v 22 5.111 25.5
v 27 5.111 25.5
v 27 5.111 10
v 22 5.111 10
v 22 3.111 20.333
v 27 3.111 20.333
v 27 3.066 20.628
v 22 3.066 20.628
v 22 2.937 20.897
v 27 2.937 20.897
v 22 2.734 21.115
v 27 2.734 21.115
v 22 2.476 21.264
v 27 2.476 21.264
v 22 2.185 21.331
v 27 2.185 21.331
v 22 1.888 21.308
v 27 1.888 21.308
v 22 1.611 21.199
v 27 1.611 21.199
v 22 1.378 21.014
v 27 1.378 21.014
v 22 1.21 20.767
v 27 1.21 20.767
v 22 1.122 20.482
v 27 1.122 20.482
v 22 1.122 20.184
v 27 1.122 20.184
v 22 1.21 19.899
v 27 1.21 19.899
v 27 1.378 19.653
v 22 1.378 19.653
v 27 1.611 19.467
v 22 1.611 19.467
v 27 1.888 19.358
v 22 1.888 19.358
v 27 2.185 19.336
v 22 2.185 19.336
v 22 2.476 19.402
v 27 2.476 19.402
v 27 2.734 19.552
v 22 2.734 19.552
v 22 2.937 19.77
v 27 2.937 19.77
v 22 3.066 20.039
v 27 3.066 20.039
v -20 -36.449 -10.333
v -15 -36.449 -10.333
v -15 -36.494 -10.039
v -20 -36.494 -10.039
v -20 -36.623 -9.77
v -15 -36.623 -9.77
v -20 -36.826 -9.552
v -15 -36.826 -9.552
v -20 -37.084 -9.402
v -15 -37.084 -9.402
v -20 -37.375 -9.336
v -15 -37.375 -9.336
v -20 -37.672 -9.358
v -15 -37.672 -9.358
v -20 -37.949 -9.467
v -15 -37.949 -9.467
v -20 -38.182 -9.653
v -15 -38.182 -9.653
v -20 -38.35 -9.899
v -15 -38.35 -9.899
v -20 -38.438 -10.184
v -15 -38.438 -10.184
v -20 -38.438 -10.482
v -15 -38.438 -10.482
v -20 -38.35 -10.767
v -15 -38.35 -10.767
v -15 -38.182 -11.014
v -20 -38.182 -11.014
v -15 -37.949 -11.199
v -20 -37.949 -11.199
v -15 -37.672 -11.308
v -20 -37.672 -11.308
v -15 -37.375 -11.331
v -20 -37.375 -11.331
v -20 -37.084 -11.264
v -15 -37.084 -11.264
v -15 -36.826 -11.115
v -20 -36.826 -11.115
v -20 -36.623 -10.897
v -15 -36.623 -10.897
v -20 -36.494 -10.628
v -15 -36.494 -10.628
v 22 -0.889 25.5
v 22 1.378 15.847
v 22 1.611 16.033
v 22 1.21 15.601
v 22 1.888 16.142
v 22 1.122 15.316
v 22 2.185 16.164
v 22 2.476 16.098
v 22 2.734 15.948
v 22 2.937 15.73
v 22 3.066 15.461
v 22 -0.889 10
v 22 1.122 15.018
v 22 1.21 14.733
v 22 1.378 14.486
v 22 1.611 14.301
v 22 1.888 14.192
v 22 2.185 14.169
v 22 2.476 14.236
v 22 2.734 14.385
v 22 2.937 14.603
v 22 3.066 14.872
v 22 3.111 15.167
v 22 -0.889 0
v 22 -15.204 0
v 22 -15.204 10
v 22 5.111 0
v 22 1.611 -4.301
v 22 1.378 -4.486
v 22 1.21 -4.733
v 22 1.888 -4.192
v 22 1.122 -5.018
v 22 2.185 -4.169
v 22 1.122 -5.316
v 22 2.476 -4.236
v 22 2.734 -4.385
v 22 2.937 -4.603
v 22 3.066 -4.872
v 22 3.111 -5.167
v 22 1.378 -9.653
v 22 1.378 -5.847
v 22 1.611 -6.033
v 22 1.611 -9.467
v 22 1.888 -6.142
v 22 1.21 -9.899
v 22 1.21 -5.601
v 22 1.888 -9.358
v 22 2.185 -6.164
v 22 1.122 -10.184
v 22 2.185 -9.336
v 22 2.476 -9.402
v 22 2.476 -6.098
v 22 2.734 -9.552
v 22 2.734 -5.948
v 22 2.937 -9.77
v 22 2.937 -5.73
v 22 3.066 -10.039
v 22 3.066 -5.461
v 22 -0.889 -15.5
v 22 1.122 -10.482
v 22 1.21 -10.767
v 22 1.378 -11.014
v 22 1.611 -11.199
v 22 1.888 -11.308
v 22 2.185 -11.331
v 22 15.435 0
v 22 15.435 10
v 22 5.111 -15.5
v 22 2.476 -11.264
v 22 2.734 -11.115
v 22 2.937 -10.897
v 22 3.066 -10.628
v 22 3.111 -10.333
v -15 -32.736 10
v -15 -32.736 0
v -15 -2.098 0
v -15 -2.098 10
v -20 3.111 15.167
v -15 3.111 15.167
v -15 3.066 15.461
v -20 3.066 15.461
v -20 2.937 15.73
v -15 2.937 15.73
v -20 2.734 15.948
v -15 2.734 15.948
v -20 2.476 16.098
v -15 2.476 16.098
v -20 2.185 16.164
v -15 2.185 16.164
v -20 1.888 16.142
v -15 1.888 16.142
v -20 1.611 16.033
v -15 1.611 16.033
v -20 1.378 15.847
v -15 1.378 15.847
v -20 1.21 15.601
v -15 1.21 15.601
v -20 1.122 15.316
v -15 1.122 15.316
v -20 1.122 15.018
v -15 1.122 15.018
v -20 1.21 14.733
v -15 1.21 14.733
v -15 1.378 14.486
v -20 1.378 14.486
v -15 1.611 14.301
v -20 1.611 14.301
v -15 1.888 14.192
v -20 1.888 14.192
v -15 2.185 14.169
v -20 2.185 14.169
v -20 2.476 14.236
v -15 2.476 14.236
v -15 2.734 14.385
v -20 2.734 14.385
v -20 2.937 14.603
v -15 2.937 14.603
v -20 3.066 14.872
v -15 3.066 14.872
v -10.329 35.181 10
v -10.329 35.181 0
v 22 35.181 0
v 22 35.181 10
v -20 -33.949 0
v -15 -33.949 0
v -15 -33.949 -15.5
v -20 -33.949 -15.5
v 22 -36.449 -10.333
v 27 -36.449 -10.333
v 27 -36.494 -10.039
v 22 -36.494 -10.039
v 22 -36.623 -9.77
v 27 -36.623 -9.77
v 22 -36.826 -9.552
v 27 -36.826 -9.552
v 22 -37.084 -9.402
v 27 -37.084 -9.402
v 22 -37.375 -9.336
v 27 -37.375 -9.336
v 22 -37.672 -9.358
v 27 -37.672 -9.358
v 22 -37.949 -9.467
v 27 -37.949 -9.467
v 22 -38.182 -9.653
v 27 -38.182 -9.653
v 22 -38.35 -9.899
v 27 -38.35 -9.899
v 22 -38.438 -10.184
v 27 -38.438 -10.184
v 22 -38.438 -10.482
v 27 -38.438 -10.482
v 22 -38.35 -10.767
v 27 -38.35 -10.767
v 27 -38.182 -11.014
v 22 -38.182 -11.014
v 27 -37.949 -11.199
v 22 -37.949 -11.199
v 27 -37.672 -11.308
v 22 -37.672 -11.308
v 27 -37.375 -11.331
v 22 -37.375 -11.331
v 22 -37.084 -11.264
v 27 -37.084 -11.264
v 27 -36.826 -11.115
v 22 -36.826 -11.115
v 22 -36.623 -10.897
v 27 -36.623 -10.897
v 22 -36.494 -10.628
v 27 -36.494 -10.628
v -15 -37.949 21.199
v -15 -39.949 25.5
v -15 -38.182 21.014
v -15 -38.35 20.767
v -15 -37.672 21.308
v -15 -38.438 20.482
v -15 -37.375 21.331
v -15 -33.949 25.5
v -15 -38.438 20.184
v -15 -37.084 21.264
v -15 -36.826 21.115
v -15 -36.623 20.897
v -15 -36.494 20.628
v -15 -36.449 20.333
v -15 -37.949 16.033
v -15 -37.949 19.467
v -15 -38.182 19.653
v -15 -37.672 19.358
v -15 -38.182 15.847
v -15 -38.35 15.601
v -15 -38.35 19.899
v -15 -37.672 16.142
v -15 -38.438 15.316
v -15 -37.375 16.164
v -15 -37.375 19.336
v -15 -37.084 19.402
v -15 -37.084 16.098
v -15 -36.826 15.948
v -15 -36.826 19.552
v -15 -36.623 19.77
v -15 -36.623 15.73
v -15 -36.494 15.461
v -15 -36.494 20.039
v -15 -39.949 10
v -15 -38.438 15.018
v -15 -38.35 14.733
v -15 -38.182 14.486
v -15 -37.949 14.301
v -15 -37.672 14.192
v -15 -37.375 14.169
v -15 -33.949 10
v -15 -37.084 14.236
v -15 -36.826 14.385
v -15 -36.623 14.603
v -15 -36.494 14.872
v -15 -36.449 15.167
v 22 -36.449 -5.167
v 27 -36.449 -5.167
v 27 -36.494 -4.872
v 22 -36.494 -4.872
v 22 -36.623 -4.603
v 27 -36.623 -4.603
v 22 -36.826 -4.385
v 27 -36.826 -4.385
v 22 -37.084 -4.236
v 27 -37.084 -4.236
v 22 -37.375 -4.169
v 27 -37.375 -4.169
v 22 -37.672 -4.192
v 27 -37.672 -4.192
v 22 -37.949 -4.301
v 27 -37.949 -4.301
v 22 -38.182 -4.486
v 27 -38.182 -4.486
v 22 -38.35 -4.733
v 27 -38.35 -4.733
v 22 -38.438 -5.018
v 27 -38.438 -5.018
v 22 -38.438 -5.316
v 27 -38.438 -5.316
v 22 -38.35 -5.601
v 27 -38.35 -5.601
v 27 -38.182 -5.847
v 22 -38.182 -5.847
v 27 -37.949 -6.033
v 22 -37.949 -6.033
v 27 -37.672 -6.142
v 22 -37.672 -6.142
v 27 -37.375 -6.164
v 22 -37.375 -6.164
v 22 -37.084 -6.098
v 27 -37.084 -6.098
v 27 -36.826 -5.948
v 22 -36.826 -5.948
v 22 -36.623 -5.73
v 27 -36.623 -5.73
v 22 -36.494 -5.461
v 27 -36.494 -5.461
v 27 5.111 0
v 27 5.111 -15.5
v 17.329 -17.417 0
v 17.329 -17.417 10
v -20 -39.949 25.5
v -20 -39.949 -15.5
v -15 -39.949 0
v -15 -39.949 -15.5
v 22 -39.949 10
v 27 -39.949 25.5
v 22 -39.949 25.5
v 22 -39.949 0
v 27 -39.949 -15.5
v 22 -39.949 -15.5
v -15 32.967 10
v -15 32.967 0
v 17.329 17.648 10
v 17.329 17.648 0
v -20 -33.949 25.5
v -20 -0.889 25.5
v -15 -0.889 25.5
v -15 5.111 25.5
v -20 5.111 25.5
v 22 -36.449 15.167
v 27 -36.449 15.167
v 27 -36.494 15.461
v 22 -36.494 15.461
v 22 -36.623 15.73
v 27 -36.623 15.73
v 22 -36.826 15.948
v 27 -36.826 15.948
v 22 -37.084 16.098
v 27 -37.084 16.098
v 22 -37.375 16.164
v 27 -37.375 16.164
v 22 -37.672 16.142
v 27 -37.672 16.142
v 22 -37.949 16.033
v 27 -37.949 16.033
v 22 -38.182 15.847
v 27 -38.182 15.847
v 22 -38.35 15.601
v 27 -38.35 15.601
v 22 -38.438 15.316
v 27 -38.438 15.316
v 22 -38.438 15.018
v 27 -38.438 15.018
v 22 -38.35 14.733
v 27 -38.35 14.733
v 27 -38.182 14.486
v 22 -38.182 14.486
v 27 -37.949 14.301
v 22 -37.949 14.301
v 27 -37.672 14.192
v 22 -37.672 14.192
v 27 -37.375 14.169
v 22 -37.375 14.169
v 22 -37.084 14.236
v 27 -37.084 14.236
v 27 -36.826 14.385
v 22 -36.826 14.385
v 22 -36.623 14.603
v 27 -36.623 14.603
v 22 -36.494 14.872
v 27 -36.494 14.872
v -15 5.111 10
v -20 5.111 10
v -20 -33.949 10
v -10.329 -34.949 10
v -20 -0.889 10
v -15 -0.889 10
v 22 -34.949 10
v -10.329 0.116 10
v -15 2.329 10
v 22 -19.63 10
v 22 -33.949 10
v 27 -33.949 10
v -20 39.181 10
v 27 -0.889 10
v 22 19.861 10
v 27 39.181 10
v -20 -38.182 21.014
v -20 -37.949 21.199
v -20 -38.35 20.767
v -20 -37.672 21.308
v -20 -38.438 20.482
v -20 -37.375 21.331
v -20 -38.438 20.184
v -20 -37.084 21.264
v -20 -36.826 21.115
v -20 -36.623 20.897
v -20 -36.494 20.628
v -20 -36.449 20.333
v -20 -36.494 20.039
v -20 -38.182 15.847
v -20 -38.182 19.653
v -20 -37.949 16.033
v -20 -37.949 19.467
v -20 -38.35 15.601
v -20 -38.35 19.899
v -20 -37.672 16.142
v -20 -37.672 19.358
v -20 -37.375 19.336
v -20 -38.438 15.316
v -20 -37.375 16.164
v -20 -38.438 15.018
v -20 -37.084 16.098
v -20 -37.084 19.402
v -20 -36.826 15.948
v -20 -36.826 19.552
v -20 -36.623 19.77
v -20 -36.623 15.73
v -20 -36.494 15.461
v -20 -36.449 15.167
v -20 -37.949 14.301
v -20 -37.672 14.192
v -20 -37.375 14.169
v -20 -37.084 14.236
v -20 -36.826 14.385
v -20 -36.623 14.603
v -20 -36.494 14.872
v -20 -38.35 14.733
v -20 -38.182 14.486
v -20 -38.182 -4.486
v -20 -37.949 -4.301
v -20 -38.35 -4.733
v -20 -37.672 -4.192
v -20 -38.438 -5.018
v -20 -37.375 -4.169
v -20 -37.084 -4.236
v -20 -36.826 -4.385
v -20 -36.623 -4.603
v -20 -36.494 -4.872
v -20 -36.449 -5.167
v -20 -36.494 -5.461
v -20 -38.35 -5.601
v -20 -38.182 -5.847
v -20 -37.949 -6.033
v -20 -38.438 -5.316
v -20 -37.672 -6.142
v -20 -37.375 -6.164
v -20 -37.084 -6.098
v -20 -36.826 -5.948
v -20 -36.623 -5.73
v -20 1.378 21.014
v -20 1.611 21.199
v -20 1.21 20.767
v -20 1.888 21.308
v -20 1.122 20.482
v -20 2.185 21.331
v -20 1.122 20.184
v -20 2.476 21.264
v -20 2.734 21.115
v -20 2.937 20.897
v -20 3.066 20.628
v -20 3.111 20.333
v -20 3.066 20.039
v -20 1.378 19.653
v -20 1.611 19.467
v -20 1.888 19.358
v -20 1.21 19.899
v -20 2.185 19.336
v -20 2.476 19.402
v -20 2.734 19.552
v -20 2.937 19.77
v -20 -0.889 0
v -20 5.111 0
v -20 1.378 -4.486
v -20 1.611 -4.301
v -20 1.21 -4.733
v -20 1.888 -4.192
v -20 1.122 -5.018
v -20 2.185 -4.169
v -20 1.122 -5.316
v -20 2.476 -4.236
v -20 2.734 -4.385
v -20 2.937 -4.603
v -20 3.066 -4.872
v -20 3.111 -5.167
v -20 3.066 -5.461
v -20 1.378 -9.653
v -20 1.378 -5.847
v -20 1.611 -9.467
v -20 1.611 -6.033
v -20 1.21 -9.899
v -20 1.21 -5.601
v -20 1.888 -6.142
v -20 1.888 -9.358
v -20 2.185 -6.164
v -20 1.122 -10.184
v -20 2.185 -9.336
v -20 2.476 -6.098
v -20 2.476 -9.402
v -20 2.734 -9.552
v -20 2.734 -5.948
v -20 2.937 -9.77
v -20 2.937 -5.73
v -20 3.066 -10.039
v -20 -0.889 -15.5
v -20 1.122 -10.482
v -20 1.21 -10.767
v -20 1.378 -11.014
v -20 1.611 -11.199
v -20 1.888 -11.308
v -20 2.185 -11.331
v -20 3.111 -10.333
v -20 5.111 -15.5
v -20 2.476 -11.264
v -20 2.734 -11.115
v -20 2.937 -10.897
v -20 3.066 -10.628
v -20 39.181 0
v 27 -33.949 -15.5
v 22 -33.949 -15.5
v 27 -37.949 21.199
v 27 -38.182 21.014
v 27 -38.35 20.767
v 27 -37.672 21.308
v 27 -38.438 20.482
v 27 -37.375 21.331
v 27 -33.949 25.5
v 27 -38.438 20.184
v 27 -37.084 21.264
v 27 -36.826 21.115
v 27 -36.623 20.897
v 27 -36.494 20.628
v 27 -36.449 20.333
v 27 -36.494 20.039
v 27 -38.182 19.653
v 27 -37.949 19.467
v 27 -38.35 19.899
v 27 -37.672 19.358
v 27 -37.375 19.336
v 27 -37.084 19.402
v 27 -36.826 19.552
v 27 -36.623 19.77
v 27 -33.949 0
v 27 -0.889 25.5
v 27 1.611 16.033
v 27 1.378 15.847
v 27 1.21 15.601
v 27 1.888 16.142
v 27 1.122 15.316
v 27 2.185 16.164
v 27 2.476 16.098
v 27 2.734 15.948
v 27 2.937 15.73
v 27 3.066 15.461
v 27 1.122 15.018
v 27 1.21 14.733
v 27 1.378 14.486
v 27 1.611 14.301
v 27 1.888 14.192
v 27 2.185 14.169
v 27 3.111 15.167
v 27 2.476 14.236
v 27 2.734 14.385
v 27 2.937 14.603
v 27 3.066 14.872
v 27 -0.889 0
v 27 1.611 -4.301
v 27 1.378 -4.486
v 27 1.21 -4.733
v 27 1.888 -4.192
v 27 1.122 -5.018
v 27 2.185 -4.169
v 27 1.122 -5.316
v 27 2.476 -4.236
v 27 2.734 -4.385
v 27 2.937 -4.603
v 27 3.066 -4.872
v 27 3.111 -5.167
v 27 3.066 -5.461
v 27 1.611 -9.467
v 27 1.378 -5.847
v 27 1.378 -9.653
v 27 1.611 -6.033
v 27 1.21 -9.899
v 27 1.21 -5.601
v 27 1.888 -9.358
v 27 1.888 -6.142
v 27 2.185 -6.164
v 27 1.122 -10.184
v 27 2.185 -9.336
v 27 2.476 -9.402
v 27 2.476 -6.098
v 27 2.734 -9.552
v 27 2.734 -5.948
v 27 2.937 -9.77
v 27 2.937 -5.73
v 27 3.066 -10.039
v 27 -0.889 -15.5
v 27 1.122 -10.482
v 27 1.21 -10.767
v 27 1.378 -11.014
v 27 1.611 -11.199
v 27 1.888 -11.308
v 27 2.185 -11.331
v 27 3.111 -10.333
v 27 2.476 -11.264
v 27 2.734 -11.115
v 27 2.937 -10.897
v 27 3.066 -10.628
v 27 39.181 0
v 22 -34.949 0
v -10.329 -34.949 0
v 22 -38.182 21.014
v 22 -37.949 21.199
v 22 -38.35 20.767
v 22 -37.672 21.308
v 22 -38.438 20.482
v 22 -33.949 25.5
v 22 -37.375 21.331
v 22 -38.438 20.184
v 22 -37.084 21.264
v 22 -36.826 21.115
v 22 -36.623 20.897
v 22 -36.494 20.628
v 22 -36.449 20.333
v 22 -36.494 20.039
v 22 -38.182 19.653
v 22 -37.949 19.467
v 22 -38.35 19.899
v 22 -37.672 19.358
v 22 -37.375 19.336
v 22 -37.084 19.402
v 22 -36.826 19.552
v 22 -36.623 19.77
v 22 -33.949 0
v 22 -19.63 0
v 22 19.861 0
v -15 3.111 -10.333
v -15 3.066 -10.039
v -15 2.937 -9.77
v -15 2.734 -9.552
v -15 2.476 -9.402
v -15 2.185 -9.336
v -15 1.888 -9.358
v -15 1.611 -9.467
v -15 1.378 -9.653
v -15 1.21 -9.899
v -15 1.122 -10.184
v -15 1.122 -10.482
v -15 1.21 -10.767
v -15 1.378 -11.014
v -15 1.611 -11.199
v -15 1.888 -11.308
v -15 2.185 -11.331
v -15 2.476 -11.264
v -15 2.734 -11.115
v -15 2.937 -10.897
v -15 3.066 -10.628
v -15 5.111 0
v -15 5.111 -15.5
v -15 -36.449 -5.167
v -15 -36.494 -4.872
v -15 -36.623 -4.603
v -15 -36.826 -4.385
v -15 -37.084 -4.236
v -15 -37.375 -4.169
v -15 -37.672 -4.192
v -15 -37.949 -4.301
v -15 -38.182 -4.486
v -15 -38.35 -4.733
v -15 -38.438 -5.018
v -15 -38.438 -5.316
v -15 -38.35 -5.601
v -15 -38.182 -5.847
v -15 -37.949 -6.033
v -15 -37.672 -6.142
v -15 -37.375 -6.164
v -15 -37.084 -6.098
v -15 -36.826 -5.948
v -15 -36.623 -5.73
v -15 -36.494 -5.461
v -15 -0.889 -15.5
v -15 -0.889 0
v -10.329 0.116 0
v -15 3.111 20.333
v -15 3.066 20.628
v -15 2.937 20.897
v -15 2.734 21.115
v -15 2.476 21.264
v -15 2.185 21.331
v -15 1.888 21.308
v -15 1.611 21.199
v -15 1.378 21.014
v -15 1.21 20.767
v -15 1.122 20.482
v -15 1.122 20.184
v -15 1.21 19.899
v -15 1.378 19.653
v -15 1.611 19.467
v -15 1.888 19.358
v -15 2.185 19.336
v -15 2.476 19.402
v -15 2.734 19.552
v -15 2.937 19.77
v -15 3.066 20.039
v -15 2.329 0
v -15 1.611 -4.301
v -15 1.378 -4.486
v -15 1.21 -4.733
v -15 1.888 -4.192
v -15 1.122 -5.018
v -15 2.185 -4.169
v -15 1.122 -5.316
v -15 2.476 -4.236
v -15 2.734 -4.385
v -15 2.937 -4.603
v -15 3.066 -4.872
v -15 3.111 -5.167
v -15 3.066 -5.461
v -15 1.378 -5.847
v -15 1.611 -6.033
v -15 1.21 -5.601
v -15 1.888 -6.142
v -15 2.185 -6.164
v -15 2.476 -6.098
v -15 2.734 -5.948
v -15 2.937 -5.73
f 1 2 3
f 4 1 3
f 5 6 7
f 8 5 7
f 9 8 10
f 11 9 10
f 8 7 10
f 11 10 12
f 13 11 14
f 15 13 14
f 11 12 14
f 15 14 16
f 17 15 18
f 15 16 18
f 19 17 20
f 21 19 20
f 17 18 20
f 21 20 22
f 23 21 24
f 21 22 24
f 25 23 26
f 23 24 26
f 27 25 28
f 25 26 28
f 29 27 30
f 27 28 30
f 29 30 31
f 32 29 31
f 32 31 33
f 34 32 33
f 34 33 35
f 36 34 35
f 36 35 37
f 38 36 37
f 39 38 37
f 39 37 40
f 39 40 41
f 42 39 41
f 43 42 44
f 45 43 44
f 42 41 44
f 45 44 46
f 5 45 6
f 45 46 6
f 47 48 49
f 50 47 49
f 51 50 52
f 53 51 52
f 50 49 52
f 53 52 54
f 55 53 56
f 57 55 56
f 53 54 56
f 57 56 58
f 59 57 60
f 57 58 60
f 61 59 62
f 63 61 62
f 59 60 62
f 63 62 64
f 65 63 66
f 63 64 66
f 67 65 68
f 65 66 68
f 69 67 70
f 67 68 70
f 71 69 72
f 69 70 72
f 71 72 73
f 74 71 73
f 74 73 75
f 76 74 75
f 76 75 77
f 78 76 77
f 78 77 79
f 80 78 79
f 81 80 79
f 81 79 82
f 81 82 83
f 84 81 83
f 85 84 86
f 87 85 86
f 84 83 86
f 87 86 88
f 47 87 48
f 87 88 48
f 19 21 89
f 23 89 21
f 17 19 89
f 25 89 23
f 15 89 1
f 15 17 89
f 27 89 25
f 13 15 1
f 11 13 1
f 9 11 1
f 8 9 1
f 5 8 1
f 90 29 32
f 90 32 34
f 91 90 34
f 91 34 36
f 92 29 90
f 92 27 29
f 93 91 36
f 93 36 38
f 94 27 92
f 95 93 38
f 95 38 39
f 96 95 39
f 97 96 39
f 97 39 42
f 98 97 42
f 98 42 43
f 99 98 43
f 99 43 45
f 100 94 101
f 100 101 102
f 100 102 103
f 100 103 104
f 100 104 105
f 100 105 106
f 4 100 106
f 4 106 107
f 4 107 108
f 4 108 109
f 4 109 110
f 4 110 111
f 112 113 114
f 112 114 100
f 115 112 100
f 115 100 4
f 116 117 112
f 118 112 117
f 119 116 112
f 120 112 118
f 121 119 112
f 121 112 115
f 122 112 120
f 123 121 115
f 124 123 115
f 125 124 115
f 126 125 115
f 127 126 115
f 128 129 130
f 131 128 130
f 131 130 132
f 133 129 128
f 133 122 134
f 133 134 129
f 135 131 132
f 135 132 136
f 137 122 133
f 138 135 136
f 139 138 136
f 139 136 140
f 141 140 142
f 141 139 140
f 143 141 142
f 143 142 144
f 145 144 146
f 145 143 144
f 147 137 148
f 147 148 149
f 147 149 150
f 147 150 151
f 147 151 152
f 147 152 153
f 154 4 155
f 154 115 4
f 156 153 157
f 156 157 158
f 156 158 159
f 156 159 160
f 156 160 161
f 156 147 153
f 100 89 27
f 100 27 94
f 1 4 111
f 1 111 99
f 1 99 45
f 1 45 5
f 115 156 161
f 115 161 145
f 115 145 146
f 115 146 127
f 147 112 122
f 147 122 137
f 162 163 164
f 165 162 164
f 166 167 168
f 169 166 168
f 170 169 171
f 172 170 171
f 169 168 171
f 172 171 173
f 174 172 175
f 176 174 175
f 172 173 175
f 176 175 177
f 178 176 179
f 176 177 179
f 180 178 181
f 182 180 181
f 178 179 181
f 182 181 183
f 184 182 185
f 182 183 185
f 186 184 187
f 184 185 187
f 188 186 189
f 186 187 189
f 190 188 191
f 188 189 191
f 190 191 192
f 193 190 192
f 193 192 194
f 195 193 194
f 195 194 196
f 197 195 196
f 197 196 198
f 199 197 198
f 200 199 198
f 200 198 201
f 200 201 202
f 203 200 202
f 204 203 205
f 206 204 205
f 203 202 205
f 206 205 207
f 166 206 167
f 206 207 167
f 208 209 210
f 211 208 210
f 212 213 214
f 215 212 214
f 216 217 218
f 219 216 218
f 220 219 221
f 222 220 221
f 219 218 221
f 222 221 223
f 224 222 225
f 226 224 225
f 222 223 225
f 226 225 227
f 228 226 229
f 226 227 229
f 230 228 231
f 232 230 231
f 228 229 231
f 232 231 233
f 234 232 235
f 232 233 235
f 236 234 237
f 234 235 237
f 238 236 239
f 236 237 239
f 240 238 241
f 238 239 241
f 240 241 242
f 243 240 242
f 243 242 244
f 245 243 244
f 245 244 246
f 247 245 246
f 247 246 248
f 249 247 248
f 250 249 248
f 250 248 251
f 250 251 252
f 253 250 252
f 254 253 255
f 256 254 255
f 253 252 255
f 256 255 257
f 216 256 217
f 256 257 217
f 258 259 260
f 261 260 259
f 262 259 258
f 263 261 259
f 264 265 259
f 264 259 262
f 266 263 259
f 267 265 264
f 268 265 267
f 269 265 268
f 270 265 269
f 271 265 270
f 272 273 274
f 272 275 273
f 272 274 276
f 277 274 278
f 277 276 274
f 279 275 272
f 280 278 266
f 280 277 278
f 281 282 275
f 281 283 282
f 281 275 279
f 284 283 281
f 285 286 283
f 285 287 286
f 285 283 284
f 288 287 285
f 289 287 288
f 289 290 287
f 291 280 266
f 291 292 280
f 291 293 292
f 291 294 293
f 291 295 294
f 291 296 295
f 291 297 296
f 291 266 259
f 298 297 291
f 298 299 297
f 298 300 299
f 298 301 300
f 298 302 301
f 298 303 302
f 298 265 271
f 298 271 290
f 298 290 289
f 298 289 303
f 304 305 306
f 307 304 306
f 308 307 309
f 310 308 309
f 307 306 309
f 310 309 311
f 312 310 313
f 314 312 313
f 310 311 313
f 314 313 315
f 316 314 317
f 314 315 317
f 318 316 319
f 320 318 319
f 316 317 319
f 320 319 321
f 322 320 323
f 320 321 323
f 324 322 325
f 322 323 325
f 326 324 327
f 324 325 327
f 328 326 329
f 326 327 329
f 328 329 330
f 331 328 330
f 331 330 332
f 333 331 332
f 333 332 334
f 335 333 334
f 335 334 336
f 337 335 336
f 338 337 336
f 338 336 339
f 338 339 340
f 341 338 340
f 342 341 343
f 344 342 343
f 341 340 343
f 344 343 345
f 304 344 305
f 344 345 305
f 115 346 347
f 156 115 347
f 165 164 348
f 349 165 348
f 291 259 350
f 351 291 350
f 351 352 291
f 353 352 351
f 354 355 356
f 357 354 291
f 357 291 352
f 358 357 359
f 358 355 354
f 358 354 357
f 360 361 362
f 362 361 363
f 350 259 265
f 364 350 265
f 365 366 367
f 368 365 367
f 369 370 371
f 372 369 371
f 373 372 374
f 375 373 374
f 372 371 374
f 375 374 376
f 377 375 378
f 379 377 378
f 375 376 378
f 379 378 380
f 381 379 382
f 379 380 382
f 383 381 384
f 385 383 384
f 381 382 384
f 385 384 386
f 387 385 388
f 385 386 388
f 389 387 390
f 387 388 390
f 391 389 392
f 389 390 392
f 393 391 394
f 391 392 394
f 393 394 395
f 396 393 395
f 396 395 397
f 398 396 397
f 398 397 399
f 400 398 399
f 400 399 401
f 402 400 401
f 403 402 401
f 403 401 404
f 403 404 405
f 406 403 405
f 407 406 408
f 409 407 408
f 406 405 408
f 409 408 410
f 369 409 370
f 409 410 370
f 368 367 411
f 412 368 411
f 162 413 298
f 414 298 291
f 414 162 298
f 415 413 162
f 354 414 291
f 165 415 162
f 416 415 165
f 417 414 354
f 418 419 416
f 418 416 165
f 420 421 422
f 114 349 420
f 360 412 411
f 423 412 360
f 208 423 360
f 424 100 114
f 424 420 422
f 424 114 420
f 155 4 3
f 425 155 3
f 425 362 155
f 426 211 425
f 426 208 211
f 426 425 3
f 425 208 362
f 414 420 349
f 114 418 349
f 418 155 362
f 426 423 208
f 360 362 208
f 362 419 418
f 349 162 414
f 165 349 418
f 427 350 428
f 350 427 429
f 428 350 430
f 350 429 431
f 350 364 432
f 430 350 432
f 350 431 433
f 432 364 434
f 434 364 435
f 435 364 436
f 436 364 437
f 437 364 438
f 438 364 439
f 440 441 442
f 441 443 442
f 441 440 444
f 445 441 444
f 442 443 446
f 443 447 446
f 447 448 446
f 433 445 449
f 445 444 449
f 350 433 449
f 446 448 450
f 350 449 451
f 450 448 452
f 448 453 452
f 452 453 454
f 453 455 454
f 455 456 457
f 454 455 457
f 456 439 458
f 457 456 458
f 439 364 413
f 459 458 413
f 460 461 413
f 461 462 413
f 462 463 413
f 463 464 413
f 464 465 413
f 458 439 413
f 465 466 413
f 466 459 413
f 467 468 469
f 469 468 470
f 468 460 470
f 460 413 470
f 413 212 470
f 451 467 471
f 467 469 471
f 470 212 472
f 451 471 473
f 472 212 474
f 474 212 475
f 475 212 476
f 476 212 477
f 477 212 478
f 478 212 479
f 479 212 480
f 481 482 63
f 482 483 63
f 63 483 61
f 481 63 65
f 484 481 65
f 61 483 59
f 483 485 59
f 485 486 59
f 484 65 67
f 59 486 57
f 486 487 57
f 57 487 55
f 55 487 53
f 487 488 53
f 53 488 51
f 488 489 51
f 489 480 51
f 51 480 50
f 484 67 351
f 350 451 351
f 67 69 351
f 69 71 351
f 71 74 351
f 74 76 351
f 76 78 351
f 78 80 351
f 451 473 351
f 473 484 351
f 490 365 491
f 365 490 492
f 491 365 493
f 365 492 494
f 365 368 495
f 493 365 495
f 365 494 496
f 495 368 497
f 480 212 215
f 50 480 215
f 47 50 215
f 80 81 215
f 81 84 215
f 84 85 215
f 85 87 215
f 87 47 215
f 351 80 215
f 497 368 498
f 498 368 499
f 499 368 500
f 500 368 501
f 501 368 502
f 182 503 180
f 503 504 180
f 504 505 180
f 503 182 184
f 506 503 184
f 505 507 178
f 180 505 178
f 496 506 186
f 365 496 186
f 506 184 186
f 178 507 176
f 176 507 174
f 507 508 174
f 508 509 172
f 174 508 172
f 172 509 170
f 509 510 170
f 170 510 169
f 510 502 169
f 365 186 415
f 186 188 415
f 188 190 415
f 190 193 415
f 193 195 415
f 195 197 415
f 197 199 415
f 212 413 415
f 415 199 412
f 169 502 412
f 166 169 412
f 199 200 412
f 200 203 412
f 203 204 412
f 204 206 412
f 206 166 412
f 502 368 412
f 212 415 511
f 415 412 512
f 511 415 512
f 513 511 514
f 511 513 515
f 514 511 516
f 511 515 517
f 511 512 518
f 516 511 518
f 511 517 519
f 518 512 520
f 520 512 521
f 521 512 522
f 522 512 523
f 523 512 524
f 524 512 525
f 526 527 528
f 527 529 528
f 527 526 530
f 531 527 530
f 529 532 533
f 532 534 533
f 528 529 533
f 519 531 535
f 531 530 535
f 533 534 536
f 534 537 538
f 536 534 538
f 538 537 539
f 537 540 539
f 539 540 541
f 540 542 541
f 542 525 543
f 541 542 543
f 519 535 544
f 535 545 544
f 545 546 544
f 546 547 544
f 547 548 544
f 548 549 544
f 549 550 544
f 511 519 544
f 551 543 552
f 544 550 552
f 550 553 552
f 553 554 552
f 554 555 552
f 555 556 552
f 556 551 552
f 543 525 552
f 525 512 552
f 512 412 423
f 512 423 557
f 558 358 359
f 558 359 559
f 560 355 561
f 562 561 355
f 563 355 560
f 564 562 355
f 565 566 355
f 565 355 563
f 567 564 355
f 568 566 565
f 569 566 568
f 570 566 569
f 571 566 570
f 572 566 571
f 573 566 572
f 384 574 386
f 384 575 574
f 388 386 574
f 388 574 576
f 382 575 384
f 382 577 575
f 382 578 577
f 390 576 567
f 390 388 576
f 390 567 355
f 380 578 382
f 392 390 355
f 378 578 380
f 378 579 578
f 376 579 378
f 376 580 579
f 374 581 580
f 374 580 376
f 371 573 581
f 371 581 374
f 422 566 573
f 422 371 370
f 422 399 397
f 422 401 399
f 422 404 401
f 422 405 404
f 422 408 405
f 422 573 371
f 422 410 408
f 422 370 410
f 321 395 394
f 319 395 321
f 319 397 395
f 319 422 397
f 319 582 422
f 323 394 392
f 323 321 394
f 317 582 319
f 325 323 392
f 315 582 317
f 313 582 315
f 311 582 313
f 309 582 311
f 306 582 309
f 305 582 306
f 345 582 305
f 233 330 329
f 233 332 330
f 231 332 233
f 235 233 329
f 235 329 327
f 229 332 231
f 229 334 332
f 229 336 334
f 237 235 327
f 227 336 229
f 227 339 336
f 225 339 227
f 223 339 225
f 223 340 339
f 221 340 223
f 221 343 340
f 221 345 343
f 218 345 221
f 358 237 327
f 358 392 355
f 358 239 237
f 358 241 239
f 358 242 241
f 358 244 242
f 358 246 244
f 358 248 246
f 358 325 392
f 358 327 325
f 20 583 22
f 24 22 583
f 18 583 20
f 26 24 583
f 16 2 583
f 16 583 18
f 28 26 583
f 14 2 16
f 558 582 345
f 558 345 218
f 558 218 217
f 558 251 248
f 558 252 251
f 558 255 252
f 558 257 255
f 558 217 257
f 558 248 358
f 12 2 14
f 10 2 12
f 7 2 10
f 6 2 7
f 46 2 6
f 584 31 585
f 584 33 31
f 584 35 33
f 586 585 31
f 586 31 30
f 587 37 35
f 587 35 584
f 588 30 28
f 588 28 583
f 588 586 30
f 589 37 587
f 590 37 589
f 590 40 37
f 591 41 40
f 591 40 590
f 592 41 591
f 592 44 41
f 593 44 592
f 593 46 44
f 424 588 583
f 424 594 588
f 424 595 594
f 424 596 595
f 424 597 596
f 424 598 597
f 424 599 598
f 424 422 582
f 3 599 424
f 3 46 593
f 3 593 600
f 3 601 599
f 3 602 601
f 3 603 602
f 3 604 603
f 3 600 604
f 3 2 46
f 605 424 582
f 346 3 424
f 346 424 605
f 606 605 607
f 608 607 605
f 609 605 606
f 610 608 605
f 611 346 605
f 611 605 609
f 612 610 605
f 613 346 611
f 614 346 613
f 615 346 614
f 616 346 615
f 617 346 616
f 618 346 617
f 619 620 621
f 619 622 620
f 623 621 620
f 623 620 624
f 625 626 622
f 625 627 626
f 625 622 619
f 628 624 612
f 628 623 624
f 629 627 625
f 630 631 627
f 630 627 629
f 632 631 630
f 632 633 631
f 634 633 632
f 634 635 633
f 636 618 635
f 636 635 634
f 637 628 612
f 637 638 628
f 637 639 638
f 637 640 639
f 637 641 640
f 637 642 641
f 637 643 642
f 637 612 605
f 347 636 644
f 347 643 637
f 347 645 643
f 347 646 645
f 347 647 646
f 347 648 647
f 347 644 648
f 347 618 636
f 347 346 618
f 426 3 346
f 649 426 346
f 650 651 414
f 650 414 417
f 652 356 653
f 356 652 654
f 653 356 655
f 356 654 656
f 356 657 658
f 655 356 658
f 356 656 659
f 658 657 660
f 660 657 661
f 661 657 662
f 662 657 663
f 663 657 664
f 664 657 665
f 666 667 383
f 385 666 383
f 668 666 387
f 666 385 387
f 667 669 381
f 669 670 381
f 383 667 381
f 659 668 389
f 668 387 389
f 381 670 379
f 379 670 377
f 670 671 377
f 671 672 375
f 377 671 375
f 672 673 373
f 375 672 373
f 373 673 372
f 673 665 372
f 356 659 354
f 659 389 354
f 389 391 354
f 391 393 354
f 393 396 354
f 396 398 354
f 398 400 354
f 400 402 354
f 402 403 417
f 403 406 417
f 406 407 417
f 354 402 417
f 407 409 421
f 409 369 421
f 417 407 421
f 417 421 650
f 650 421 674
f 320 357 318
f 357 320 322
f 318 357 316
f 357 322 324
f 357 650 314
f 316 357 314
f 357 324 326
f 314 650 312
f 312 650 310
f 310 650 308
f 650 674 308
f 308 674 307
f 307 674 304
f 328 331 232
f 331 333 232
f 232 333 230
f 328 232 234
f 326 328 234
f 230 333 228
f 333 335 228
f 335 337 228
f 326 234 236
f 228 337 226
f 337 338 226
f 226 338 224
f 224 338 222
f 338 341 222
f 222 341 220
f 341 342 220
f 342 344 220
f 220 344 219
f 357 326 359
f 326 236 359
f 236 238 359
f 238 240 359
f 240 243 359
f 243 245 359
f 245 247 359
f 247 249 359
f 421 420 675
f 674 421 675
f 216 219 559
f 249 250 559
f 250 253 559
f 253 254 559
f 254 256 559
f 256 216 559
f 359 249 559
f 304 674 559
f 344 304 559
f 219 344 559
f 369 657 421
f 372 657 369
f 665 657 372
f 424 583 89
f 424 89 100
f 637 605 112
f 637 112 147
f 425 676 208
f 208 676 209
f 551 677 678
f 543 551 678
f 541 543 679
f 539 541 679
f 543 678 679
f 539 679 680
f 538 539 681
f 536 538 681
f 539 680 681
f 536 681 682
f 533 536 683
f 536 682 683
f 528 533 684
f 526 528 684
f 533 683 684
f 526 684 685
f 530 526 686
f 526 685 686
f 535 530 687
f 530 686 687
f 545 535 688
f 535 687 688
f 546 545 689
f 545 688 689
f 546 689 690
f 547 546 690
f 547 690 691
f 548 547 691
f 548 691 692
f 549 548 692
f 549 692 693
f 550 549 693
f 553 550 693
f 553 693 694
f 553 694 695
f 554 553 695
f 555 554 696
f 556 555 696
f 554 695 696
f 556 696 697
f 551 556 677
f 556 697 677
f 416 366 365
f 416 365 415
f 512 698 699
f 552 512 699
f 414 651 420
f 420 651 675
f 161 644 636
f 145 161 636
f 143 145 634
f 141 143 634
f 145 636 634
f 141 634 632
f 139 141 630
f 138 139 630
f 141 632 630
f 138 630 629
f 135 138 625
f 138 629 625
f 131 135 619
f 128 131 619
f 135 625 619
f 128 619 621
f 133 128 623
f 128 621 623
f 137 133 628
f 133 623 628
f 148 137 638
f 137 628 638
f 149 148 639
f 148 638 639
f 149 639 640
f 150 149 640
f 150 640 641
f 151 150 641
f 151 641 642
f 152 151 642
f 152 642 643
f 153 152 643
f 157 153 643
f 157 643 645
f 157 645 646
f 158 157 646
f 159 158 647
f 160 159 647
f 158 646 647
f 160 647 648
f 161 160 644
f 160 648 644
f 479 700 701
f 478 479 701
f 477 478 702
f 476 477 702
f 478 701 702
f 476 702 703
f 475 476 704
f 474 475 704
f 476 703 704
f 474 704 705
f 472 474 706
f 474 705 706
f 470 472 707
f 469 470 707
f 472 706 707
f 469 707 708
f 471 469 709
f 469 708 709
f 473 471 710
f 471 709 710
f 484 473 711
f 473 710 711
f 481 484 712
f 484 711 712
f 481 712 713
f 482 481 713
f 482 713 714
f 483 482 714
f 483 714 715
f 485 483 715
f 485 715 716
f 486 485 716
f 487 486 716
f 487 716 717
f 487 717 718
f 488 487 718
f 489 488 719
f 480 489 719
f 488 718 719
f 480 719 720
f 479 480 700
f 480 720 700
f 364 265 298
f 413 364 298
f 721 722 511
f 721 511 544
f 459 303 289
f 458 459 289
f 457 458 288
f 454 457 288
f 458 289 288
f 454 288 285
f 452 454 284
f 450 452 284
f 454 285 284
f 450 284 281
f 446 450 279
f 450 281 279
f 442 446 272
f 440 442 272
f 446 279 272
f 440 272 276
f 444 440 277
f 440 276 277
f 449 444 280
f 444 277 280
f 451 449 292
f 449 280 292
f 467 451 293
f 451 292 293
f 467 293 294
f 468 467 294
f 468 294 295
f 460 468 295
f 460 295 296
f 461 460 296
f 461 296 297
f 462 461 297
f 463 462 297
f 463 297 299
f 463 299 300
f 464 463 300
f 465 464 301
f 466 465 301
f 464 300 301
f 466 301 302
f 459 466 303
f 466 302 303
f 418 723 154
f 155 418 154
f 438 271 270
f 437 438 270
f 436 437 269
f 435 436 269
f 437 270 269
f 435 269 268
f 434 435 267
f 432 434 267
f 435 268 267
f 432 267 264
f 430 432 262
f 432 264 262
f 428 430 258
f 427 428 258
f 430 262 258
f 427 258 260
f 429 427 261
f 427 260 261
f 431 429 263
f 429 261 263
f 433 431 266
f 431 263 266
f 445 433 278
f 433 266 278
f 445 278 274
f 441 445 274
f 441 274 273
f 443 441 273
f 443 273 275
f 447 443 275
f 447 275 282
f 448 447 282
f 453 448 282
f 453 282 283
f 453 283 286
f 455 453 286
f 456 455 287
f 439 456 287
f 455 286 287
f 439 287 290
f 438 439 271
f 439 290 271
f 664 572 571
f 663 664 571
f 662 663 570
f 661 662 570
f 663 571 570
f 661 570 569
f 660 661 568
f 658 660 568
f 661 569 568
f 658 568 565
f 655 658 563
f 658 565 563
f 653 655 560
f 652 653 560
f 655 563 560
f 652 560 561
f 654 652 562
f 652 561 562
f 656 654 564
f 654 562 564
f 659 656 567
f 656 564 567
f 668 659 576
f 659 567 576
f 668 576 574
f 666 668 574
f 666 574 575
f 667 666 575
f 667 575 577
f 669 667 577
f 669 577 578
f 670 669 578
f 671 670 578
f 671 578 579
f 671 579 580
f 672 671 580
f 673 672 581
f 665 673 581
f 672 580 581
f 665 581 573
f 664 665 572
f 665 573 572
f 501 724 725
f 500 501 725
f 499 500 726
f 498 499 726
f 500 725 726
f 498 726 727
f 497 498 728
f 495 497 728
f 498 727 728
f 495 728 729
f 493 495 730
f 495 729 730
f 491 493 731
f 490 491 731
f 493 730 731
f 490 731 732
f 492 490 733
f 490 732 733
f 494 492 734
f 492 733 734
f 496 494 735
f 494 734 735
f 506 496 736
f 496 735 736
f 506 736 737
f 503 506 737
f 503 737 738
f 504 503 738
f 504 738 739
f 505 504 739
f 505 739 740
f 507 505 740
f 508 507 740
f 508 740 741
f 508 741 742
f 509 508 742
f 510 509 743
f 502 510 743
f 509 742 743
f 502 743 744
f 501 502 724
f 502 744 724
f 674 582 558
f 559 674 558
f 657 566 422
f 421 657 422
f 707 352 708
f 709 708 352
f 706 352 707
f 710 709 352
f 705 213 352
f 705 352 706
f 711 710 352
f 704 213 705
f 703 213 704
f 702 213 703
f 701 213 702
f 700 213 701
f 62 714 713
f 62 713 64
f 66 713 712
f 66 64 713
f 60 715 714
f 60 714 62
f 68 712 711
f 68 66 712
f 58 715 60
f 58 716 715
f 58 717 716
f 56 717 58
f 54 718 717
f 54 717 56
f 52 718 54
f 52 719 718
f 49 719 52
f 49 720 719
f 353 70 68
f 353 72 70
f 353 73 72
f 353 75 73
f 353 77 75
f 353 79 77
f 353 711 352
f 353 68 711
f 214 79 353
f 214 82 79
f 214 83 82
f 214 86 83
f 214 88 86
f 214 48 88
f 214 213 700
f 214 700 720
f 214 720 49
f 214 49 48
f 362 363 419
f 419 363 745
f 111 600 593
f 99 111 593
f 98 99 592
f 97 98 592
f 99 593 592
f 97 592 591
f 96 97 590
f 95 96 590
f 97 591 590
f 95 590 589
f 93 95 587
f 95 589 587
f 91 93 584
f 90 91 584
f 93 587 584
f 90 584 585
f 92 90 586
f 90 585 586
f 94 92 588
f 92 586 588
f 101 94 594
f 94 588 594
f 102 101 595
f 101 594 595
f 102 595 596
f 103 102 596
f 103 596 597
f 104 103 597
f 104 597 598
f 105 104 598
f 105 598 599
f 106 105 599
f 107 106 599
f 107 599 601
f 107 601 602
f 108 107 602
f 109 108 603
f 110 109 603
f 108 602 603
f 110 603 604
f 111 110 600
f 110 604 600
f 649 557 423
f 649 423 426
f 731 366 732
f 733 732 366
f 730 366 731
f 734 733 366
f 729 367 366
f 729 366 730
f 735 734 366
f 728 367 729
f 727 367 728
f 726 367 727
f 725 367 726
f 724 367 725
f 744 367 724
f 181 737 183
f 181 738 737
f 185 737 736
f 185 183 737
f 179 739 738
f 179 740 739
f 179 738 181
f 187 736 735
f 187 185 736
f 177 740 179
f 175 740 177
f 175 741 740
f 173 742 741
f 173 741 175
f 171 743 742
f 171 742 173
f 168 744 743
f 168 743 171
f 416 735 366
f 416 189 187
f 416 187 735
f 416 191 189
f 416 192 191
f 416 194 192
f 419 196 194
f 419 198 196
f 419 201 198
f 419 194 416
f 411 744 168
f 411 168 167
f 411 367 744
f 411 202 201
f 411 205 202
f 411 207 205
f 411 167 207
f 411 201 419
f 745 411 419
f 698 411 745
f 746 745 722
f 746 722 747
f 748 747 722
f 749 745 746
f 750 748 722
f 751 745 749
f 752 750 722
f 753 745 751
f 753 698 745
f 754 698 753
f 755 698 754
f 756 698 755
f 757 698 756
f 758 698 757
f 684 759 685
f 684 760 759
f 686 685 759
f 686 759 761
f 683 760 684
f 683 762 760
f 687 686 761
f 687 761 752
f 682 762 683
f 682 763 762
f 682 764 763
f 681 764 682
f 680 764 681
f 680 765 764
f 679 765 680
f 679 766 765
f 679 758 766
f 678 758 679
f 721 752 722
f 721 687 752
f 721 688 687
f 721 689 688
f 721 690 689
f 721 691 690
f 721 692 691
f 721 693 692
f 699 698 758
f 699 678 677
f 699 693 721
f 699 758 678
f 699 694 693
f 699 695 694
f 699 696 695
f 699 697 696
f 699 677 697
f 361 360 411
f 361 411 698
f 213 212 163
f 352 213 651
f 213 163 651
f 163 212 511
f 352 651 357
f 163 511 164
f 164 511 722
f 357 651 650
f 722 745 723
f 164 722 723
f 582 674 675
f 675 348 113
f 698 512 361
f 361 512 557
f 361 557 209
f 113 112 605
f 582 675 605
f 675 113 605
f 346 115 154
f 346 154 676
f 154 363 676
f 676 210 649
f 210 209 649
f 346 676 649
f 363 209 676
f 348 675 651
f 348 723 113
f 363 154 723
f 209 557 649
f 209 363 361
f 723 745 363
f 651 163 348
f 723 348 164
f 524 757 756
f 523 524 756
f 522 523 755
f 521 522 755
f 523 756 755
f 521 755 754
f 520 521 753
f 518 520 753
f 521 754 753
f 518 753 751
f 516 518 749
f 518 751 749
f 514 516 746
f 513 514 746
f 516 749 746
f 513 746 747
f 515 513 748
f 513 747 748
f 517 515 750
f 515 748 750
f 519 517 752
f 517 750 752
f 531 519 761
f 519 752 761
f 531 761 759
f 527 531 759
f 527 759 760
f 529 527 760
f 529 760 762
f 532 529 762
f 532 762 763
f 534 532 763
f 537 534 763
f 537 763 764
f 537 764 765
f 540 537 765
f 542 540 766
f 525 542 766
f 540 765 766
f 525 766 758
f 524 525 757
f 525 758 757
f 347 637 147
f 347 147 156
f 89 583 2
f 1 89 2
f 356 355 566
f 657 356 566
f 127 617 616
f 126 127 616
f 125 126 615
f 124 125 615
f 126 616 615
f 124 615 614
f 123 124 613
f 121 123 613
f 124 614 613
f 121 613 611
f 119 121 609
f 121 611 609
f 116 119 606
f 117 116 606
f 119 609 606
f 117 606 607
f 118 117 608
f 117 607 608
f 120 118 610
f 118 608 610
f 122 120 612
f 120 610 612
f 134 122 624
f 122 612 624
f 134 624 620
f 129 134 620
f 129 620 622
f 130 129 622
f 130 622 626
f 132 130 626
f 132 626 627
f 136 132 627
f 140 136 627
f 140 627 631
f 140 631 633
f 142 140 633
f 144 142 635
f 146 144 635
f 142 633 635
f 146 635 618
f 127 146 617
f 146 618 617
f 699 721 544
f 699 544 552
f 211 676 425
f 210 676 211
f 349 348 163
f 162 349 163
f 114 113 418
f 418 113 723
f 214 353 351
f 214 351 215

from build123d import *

# Parameters (mm, degrees)
SKETCH_1_W      = 47
SKETCH_1_H      = 79.13
SKETCH_1_W_2    = 37
SKETCH_1_H_2    = 70.13
EXTRUDE_2_DEPTH = 10
SKETCH_2_W      = 15.5
SKETCH_2_H      = 6
SKETCH_2_R      = 1
EXTRUDE_3_DEPTH = 5
EXTRUDE_START   = -42
SKETCH_2_2_W    = 15.5
SKETCH_2_2_H    = 6
SKETCH_2_2_R    = 1
EXTRUDE_4_DEPTH = 5


with BuildPart() as part:
    # 스케치1 → 보스-돌출2 (new body)
    # profile 1 of 8: a face of its own
    with BuildSketch(Plane.XY):
        with Locations((3.5, -0.384376544)):
            Rectangle(SKETCH_1_W, SKETCH_1_H)
        with Locations((3.5, 0.115623456)):
            Rectangle(SKETCH_1_W_2, SKETCH_1_H_2, mode=Mode.SUBTRACT)
    # profile 2 of 8: a face of its own
    with BuildSketch(Plane.XY):
        Polygon((-10.329391215, 35.180623456), (-15, 35.180623456), (-15, 32.967449172), (17.329391215, 17.648123456), (22, 19.861297741), align=None)
    # profile 3 of 8: a face of its own
    with BuildSketch(Plane.XY):
        Polygon((22, 15.434949172), (22, 19.861297741), (17.329391215, 17.648123456), align=None)
    # profile 4 of 8: a face of its own
    with BuildSketch(Plane.XY):
        Polygon((17.329391215, 17.648123456), (-15, 2.328797741), (-10.329391215, 0.115623456), (22, 15.434949172), align=None)
    # profile 5 of 8: a face of its own
    with BuildSketch(Plane.XY):
        Polygon((-10.329391215, 0.115623456), (-15, 2.328797741), (-15, -2.097550828), align=None)
    # profile 6 of 8: a face of its own
    with BuildSketch(Plane.XY):
        Polygon((-10.329391215, 0.115623456), (-15, -2.097550828), (17.329391215, -17.416876544), (22, -15.203702259), align=None)
    # profile 7 of 8: a face of its own
    with BuildSketch(Plane.XY):
        Polygon((22, -19.630050828), (22, -15.203702259), (17.329391215, -17.416876544), align=None)
    # profile 8 of 8: a face of its own
    with BuildSketch(Plane.XY):
        Polygon((17.329391215, -17.416876544), (-15, -32.736202259), (-15, -34.949376544), (-10.329391215, -34.949376544), (22, -19.630050828), align=None)
    extrude(amount=EXTRUDE_2_DEPTH)

    # 스케치2 → 보스-돌출3 (add)
    # profile 1 of 4: a face of its own
    with BuildSketch(Plane(origin=(27, 0, 0), x_dir=(0, 0, -1), z_dir=(1, 0, 0))):
        with Locations((-17.75, -36.949376544)):
            Rectangle(SKETCH_2_W, SKETCH_2_H)
        with Locations(Location((-20.333333333, -37.449376544, 0), (0, 0, 90))):
            Circle(SKETCH_2_R, mode=Mode.SUBTRACT)
        with Locations(Location((-15.166666667, -37.449376544, 0), (0, 0, 90))):
            Circle(SKETCH_2_R, mode=Mode.SUBTRACT)
    # profile 2 of 4: a face of its own
    with BuildSketch(Plane(origin=(27, 0, 0), x_dir=(0, 0, -1), z_dir=(1, 0, 0))):
        with Locations((7.75, -36.949376544)):
            Rectangle(SKETCH_2_W, SKETCH_2_H)
        with Locations(Location((5.166666667, -37.449376544, 0), (0, 0, 90))):
            Circle(SKETCH_2_R, mode=Mode.SUBTRACT)
        with Locations(Location((10.333333333, -37.449376544, 0), (0, 0, 90))):
            Circle(SKETCH_2_R, mode=Mode.SUBTRACT)
    # profile 3 of 4: a face of its own
    with BuildSketch(Plane(origin=(27, 0, 0), x_dir=(0, 0, -1), z_dir=(1, 0, 0))):
        with Locations((-17.75, 2.110623456)):
            Rectangle(SKETCH_2_W, SKETCH_2_H)
        with Locations(Location((-20.333333333, 2.110623456, 0), (0, 0, 90))):
            Circle(SKETCH_2_R, mode=Mode.SUBTRACT)
        with Locations(Location((-15.166666667, 2.110623456, 0), (0, 0, 90))):
            Circle(SKETCH_2_R, mode=Mode.SUBTRACT)
    # profile 4 of 4: a face of its own
    with BuildSketch(Plane(origin=(27, 0, 0), x_dir=(0, 0, -1), z_dir=(1, 0, 0))):
        with Locations((7.75, 2.110623456)):
            Rectangle(SKETCH_2_W, SKETCH_2_H)
        with Locations(Location((5.166666667, 2.110623456, 0), (0, 0, 90))):
            Circle(SKETCH_2_R, mode=Mode.SUBTRACT)
        with Locations(Location((10.333333333, 2.110623456, 0), (0, 0, 90))):
            Circle(SKETCH_2_R, mode=Mode.SUBTRACT)
    extrude(amount=-EXTRUDE_3_DEPTH)

    # 스케치2<2> → 보스-돌출4 (add)
    # profile 1 of 4: a face of its own
    with BuildSketch(Plane(origin=(27, 0, 0), x_dir=(0, 0, -1), z_dir=(1, 0, 0)).offset(EXTRUDE_START)):
        with Locations((-17.75, -36.949376544)):
            Rectangle(SKETCH_2_2_W, SKETCH_2_2_H)
        with Locations(Location((-20.333333333, -37.449376544, 0), (0, 0, 90))):
            Circle(SKETCH_2_2_R, mode=Mode.SUBTRACT)
        with Locations(Location((-15.166666667, -37.449376544, 0), (0, 0, 90))):
            Circle(SKETCH_2_2_R, mode=Mode.SUBTRACT)
    # profile 2 of 4: a face of its own
    with BuildSketch(Plane(origin=(27, 0, 0), x_dir=(0, 0, -1), z_dir=(1, 0, 0)).offset(EXTRUDE_START)):
        with Locations((7.75, -36.949376544)):
            Rectangle(SKETCH_2_2_W, SKETCH_2_2_H)
        with Locations(Location((5.166666667, -37.449376544, 0), (0, 0, 90))):
            Circle(SKETCH_2_2_R, mode=Mode.SUBTRACT)
        with Locations(Location((10.333333333, -37.449376544, 0), (0, 0, 90))):
            Circle(SKETCH_2_2_R, mode=Mode.SUBTRACT)
    # profile 3 of 4: a face of its own
    with BuildSketch(Plane(origin=(27, 0, 0), x_dir=(0, 0, -1), z_dir=(1, 0, 0)).offset(EXTRUDE_START)):
        with Locations((-17.75, 2.110623456)):
            Rectangle(SKETCH_2_2_W, SKETCH_2_2_H)
        with Locations(Location((-20.333333333, 2.110623456, 0), (0, 0, 90))):
            Circle(SKETCH_2_2_R, mode=Mode.SUBTRACT)
        with Locations(Location((-15.166666667, 2.110623456, 0), (0, 0, 90))):
            Circle(SKETCH_2_2_R, mode=Mode.SUBTRACT)
    # profile 4 of 4: a face of its own
    with BuildSketch(Plane(origin=(27, 0, 0), x_dir=(0, 0, -1), z_dir=(1, 0, 0)).offset(EXTRUDE_START)):
        with Locations((7.75, 2.110623456)):
            Rectangle(SKETCH_2_2_W, SKETCH_2_2_H)
        with Locations(Location((5.166666667, 2.110623456, 0), (0, 0, 90))):
            Circle(SKETCH_2_2_R, mode=Mode.SUBTRACT)
        with Locations(Location((10.333333333, 2.110623456, 0), (0, 0, 90))):
            Circle(SKETCH_2_2_R, mode=Mode.SUBTRACT)
    extrude(amount=-EXTRUDE_4_DEPTH)


solid = part.part
